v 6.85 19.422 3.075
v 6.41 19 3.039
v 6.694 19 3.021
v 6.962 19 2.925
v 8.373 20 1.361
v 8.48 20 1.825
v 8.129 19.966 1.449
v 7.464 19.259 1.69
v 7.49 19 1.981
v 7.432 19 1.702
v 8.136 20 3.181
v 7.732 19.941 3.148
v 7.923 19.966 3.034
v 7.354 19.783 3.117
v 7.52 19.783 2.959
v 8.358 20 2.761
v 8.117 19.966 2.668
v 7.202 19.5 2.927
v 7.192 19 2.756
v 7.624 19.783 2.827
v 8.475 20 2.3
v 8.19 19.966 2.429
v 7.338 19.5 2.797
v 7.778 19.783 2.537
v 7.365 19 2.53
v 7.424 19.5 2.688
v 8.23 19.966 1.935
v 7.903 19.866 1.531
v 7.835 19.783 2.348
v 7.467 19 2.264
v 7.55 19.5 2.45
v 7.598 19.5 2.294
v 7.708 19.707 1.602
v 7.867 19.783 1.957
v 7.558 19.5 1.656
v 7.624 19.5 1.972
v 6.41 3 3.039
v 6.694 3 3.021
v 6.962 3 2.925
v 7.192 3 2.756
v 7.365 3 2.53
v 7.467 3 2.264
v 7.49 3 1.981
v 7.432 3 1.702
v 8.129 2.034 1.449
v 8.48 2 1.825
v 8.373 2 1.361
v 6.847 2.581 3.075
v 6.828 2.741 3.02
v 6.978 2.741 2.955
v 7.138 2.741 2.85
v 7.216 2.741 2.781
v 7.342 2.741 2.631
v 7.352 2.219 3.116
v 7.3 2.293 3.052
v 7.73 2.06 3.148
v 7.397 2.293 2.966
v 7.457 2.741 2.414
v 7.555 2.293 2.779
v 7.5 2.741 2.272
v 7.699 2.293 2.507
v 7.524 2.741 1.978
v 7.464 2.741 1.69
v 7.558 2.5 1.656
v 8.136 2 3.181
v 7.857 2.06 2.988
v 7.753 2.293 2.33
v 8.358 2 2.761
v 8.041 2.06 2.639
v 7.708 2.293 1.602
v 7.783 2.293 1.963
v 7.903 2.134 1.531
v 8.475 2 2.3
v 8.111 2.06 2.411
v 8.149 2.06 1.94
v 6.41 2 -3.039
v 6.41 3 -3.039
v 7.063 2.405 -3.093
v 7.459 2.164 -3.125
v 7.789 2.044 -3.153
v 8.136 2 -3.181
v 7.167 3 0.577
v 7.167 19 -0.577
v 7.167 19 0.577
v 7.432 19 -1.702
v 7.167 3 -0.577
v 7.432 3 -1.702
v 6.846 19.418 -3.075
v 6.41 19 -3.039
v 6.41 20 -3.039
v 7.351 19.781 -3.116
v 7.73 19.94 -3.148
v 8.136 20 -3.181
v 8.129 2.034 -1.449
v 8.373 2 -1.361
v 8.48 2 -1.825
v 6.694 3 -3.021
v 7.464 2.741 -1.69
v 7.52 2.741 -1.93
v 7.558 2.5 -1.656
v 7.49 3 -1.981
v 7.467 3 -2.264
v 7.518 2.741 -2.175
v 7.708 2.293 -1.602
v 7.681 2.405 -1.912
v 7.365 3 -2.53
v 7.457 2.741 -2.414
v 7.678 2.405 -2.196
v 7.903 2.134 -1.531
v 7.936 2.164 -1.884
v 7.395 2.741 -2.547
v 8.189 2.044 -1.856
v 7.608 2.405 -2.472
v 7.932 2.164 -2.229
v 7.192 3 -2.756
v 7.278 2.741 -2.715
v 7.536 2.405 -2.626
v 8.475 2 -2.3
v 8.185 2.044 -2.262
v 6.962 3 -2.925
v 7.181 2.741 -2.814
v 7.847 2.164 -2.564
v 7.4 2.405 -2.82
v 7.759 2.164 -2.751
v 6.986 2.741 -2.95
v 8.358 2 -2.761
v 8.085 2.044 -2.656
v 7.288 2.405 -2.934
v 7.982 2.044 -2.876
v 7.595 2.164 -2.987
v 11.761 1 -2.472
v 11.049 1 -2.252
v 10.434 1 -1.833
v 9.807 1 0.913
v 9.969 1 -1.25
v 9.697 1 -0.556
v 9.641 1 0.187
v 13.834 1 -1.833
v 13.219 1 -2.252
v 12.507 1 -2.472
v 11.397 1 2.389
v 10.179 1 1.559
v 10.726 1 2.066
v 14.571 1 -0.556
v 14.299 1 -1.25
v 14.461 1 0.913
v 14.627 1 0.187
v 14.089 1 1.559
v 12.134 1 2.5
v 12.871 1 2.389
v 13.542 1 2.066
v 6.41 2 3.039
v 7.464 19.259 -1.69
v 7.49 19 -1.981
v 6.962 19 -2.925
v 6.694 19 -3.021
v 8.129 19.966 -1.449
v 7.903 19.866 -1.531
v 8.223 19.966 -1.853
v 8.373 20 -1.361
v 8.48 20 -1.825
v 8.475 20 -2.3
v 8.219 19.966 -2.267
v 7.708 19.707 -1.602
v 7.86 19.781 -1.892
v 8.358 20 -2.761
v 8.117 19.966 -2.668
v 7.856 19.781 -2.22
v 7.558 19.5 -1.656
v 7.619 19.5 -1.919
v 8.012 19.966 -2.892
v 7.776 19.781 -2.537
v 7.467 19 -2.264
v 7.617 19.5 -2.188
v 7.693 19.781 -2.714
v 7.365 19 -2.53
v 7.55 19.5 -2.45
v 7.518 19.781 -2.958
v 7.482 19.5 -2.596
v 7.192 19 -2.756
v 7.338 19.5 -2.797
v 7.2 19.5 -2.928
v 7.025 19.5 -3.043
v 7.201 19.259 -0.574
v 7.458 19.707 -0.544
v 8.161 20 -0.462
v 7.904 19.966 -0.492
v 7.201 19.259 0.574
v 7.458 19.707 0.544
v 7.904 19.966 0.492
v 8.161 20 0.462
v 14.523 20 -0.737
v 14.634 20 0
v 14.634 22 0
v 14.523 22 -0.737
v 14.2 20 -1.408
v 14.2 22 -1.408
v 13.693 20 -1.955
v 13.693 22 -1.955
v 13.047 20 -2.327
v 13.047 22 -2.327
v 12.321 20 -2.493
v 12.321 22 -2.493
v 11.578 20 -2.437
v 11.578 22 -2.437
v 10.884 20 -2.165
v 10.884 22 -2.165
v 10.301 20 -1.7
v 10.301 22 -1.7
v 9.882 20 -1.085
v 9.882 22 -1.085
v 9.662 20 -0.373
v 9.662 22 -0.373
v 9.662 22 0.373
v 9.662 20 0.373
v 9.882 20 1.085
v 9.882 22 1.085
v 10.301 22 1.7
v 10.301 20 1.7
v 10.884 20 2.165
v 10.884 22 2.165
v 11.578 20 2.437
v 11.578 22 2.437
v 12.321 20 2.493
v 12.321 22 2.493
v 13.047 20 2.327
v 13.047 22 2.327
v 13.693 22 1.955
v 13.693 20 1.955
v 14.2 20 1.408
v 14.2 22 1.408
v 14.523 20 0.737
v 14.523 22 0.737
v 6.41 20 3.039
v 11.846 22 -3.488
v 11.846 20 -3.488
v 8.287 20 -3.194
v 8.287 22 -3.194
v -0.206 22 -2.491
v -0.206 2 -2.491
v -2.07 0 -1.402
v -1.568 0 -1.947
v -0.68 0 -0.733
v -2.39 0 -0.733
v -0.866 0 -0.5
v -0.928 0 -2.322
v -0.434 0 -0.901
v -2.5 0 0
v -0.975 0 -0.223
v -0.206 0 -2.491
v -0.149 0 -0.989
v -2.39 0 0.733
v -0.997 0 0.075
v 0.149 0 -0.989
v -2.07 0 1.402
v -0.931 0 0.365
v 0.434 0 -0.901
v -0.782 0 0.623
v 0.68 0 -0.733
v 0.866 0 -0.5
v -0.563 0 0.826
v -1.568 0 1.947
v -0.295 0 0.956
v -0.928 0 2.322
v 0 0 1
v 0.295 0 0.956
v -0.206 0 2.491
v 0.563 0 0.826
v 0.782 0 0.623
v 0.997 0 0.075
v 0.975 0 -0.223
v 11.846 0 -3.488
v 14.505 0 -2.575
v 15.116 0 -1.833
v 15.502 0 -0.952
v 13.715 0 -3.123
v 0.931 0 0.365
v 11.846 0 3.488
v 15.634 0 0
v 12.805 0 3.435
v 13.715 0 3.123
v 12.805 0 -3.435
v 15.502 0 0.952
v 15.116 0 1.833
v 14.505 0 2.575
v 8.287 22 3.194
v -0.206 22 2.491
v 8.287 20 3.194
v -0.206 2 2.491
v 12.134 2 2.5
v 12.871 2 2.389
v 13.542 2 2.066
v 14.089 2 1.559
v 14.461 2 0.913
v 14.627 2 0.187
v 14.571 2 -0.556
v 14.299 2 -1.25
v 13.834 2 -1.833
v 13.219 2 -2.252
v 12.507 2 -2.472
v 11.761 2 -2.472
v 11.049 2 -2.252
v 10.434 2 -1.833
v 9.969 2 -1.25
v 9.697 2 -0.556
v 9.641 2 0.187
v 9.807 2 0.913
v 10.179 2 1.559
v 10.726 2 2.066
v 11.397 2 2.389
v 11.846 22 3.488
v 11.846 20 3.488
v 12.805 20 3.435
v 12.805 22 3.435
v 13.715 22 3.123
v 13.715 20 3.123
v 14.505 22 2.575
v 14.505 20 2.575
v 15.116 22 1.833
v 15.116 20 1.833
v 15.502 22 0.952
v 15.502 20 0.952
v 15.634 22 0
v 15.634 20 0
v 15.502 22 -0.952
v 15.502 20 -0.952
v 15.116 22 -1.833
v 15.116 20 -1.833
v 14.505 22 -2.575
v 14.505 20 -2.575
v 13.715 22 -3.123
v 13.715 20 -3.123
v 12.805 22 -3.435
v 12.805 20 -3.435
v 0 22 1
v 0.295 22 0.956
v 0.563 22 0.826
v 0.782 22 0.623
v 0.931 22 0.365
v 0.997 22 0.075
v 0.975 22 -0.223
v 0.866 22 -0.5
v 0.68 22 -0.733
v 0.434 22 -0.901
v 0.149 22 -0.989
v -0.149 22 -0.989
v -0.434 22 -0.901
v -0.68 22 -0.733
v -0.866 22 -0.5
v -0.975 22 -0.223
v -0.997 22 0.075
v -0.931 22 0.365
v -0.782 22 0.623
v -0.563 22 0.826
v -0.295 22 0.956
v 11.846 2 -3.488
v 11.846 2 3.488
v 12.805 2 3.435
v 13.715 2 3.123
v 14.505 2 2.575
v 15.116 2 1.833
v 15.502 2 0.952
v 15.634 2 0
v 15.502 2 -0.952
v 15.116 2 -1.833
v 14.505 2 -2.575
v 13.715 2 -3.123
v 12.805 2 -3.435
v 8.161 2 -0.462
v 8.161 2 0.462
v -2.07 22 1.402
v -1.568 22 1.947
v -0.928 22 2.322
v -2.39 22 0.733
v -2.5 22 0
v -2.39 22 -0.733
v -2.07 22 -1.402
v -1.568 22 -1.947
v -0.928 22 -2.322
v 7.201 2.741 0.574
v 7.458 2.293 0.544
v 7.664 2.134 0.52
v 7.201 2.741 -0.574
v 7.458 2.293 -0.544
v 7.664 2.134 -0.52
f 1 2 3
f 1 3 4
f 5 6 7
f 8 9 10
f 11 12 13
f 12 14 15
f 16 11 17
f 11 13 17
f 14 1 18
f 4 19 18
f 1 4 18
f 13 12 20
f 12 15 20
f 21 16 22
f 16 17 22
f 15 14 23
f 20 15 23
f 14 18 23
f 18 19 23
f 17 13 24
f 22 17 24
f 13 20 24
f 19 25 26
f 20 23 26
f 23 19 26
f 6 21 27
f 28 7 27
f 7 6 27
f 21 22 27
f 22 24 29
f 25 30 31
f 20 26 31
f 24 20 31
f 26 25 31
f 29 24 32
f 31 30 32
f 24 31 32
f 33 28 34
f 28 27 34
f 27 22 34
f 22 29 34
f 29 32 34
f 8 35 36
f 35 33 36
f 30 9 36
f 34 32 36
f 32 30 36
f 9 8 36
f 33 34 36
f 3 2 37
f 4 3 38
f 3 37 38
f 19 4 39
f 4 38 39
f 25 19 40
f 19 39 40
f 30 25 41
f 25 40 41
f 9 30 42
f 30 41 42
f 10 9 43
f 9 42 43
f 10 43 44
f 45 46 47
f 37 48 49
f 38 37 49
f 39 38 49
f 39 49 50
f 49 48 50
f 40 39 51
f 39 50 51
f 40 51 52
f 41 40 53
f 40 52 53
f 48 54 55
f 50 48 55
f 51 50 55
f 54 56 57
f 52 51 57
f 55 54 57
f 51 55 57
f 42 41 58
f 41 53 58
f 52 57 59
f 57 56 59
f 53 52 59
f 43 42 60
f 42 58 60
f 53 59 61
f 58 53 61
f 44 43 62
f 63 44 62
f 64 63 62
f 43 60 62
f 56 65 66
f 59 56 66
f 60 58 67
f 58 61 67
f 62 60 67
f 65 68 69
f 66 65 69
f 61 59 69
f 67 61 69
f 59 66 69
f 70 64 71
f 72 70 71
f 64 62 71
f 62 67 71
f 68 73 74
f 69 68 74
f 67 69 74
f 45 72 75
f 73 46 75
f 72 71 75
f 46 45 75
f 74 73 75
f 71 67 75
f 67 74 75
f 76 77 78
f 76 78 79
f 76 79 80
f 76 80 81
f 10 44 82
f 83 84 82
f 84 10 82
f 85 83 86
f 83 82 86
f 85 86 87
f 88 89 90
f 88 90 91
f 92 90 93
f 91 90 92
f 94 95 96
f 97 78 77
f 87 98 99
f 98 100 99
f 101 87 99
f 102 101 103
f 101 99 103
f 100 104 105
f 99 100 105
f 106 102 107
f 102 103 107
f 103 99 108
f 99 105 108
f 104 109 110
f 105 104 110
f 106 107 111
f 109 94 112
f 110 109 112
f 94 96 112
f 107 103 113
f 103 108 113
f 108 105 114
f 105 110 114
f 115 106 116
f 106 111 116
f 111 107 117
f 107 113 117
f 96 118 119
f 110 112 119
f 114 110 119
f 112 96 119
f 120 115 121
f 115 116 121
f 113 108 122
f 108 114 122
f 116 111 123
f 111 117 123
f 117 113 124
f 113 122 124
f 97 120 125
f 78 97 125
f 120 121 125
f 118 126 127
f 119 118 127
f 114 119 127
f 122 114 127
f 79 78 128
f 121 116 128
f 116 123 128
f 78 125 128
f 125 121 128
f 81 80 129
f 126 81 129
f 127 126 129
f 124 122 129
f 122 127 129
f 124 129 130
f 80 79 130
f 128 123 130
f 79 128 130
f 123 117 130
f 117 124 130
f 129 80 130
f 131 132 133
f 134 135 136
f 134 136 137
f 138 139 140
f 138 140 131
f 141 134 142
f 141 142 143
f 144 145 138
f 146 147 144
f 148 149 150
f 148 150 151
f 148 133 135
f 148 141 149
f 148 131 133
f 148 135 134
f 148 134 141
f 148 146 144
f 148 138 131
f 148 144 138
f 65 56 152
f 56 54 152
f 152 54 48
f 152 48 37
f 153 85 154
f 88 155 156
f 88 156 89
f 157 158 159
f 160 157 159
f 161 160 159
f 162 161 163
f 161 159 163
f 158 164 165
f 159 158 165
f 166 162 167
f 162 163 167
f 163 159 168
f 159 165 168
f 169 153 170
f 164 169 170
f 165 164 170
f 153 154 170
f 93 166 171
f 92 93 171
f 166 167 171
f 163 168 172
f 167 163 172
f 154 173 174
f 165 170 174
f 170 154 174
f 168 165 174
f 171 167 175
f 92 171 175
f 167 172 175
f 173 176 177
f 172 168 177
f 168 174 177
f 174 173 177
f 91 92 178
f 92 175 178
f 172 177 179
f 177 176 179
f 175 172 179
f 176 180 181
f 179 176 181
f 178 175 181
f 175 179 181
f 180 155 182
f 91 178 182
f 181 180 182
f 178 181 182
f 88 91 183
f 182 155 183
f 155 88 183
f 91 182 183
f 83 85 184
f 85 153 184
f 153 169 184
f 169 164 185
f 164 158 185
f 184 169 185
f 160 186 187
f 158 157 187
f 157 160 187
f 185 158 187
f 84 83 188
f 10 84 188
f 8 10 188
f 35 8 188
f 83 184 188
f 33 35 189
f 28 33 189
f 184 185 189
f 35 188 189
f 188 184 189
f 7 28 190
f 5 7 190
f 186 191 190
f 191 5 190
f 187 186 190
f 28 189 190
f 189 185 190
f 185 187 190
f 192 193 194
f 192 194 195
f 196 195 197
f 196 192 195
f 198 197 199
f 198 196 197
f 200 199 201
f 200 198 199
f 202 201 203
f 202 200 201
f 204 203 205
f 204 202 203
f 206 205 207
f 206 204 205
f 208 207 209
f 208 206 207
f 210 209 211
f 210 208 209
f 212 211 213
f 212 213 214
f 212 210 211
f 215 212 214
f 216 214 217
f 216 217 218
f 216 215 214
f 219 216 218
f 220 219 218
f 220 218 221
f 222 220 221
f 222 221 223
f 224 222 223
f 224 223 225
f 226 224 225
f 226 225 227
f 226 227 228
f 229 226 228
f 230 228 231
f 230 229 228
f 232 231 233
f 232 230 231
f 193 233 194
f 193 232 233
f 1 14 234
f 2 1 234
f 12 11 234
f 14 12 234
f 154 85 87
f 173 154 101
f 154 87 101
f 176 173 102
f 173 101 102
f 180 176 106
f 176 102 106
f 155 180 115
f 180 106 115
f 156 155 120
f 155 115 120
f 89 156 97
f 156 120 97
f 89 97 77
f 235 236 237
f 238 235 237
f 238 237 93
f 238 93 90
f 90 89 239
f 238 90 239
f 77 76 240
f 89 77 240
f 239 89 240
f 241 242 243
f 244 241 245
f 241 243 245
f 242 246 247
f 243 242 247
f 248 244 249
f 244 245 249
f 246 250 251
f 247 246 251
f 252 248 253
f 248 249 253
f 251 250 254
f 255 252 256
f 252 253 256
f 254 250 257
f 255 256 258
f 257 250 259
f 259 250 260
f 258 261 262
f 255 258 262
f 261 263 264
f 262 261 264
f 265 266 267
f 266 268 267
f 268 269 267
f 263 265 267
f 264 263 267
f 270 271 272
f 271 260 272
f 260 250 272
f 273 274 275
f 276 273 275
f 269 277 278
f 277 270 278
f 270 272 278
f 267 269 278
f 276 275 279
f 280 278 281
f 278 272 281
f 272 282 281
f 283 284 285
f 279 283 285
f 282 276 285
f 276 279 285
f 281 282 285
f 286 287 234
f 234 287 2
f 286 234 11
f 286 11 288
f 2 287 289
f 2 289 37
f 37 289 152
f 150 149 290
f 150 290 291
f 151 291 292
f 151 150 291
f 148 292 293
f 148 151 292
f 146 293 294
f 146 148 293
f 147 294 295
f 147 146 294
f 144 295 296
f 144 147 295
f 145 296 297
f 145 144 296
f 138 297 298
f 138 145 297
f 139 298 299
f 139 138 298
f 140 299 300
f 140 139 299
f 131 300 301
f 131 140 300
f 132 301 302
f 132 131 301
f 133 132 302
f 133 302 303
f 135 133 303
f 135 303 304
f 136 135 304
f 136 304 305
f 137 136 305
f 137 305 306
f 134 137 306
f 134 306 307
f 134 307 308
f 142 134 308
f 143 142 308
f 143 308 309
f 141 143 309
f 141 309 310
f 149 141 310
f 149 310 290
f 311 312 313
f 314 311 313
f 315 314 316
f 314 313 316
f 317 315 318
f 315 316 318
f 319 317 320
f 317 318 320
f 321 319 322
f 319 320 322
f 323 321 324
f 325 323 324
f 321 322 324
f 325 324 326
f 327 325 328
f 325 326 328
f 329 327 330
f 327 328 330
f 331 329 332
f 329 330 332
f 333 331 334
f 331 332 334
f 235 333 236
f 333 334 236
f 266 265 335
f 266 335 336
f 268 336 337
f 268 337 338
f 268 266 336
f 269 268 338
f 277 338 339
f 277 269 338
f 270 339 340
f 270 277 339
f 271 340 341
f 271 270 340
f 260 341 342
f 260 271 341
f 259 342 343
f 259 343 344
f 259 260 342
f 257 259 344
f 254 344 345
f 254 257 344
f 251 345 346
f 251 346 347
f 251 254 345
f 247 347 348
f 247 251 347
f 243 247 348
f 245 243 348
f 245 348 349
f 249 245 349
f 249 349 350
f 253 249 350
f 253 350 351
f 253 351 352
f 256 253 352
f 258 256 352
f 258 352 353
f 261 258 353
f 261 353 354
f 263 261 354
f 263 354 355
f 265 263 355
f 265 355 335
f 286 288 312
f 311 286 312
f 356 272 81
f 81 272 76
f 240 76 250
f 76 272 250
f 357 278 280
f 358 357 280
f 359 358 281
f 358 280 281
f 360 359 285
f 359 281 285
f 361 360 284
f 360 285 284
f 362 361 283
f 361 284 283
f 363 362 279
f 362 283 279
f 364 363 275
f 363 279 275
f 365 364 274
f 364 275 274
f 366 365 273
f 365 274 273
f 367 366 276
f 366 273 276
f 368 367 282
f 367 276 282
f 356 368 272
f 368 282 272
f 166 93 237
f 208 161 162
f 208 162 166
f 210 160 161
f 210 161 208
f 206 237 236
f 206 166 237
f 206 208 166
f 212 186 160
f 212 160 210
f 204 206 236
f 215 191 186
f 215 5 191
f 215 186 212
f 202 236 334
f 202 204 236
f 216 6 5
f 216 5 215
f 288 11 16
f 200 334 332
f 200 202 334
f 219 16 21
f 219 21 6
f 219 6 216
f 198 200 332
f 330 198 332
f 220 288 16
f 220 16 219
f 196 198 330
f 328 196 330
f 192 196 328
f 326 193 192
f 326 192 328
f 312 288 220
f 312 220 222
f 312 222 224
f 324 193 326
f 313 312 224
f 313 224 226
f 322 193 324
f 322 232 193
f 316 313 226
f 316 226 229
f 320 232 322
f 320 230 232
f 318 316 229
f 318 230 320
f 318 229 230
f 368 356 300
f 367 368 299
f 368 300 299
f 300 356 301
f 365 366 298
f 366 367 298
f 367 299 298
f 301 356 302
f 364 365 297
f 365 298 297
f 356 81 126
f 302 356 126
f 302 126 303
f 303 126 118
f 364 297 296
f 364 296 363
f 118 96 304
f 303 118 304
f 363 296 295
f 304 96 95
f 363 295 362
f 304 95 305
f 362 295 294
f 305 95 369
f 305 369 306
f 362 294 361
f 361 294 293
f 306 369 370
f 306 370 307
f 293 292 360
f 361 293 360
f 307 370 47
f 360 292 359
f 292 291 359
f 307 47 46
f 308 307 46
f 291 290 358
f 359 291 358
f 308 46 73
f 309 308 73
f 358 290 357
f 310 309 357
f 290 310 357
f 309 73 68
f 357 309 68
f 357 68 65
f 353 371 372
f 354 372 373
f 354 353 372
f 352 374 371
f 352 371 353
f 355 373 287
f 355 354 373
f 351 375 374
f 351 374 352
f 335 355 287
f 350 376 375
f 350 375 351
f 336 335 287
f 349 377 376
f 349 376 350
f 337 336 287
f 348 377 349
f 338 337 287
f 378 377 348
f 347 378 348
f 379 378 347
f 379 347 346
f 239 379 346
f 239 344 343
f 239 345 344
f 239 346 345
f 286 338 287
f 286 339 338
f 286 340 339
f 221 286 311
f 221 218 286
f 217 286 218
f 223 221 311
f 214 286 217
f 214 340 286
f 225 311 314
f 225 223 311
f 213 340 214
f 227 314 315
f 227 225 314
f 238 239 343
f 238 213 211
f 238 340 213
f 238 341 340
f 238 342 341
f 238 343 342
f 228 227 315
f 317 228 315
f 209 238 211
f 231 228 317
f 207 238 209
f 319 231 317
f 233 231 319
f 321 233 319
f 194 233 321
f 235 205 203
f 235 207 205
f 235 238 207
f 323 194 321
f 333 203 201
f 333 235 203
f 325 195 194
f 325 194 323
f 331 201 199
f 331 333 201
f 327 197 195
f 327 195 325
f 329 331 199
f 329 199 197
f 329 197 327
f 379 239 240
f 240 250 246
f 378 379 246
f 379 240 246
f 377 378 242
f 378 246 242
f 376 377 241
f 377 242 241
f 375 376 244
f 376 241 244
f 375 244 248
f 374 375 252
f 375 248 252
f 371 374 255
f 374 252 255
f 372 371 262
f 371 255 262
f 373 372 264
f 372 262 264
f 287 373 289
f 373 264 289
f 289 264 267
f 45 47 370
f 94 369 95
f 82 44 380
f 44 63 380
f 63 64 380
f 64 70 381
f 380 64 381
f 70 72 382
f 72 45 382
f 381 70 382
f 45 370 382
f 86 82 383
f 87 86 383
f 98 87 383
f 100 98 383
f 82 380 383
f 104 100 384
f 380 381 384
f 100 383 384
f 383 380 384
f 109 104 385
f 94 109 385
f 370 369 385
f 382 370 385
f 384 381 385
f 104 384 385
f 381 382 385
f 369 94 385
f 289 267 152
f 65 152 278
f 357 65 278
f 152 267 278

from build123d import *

# Parameters (mm, degrees)
SKETCH1_R               = 1
SKETCH1_R_2             = 2.5
BOSS_EXTRUDE5_DEPTH     = 2
SKETCH1_7_R             = 2.5
SKETCH1_7_R_2           = 1
BOSS_EXTRUDE6_DEPTH     = 22
BOSS_EXTRUDE7_START     = 20
BOSS_EXTRUDE7_OUTLINE_R = 2.5
BOSS_EXTRUDE7_DEPTH     = 2
SKETCH1_9_R             = 2.5
BOSS_EXTRUDE8_DEPTH     = 1
FILLET3_R               = 1
FILLET1_R               = 1


# Read off the part's stored shape, not the designer's step: Boss-Extrude7
with BuildPart() as part:
    # Sketch1 → Boss-Extrude5 (new body)
    with BuildSketch(Plane(origin=(0, 0, 0), x_dir=(1, 0, 0), z_dir=(0, 1, 0))):
        with BuildLine():
            ThreePointArc((-0.206033327, 2.491495589), (-2.5, 0), (-0.206033327, -2.491495589))
            Line((-0.206033327, -2.491495589), (11.845512634, -3.488093824))
            ThreePointArc((11.845512634, -3.488093824), (15.633959292, 0), (11.845512634, 3.488093824))
            Line((11.845512634, 3.488093824), (-0.206033327, 2.491495589))
        make_face()
        with Locations(Location((0, 0, 0), (0, 0, 270))):
            Circle(SKETCH1_R, mode=Mode.SUBTRACT)
        with Locations(Location((12.133959292, 0, 0), (0, 0, 270))):
            Circle(SKETCH1_R_2, mode=Mode.SUBTRACT)
    extrude(amount=BOSS_EXTRUDE5_DEPTH)

    # Sketch1<7> → Boss-Extrude6 (add)
    # profile 1 of 2: a face of its own
    with BuildSketch(Plane(origin=(0, 0, 0), x_dir=(1, 0, 0), z_dir=(0, 1, 0))):
        Circle(SKETCH1_7_R)
        with Locations(Location((0, 0, 0), (0, 0, 270))):
            Circle(SKETCH1_7_R_2, mode=Mode.SUBTRACT)
    # profile 2 of 2: a face of its own
    with BuildSketch(Plane(origin=(0, 0, 0), x_dir=(1, 0, 0), z_dir=(0, 1, 0))):
        with BuildLine():
            Line((8.286945149, 3.193819373), (-0.206033327, 2.491495589))
            ThreePointArc((-0.206033327, 2.491495589), (1.693357122, 1.839168741), (2.5, 0))
            ThreePointArc((2.5, 0), (1.693357122, -1.839168741), (-0.206033327, -2.491495589))
            Line((-0.206033327, -2.491495589), (8.286945149, -3.193819373))
            ThreePointArc((8.286945149, -3.193819373), (7.133959292, 0), (8.286945149, 3.193819373))
        make_face()
    extrude(amount=BOSS_EXTRUDE6_DEPTH)

    # Boss-Extrude7 outline → Boss-Extrude7 (add)
    with BuildSketch(Plane(origin=(0, 0, 0), x_dir=(1, 0, 0), z_dir=(0, 1, 0)).offset(BOSS_EXTRUDE7_START)):
        with BuildLine():
            Line((8.286945149, -3.193819373), (11.845512634, -3.488093824))
            ThreePointArc((11.845512634, -3.488093824), (15.633959292, 0), (11.845512634, 3.488093824))
            Line((11.845512634, 3.488093824), (8.286945149, 3.193819373))
            ThreePointArc((8.286945149, 3.193819373), (7.133959292, 0), (8.286945149, -3.193819373))
        make_face()
        with Locations((12.133959292, 0)):
            Circle(BOSS_EXTRUDE7_OUTLINE_R, mode=Mode.SUBTRACT)
    extrude(amount=BOSS_EXTRUDE7_DEPTH)

    # Sketch1<9> → Boss-Extrude8 (add)
    with BuildSketch(Plane(origin=(0, 0, 0), x_dir=(1, 0, 0), z_dir=(0, 1, 0))):
        with Locations(Location((12.133959292, 0, 0), (0, 0, 270))):
            Circle(SKETCH1_9_R)
    extrude(amount=BOSS_EXTRUDE8_DEPTH)

    # Fillet3
    # the kernel refuses this fillet: 1 mm, written as the material it takes off along each edge
    with BuildSketch(Plane(origin=(8.286945149, 2, 3.193819373), x_dir=(-0.49694917619000334, 0, -0.8677796473091985), z_dir=(0, 1, 0))) as fillet3_piece_1:
        with BuildLine():
            CenterArc((1.891474067, 0.985105296), FILLET3_R, 145.474338823, 114.624318352)
            Line((1.067601639, 1.55188058), (0, 0))
            ThreePointArc((0, 0), (0.85976094, 0.074473518), (1.719521879, 0))
        make_face()
    extrude(amount=18, mode=Mode.SUBTRACT)
    with BuildSketch(Plane(origin=(8.286945149, 2, -3.193819373), x_dir=(-0.9965982354592262, 0, 0.08241333071510189), z_dir=(0, 1, 0))) as fillet3_piece_2:
        with BuildLine():
            CenterArc((1.883641843, 1), FILLET3_R, 155.375681648, 114.624318352)
            ThreePointArc((0.9745825, 1.416666667), (0.548647928, 0.666123584), (0, 0))
            Line((0, 0), (1.883641843, 0))
        make_face()
    extrude(amount=18, mode=Mode.SUBTRACT)

    # Fillet1
    # the kernel refuses this fillet: 1 mm, written as the material it adds along each edge
    with BuildSketch(Plane(origin=(12.133959294, 20, 0), x_dir=(-0.9403058248886403, 0, -0.34033065639241744), z_dir=(0.34033065639241744, 0, -0.9403058248886403))) as fillet1_piece_1:
        with BuildLine():
            CenterArc((5.000000002 - FILLET1_R, -FILLET1_R), FILLET1_R, 0, 90)
            Line((5.000000002 - FILLET1_R, 0), (5.000000002, 0))
            Line((5.000000002, 0), (5.000000002, -FILLET1_R))
        make_face()
    revolve(axis=Axis((12.133959294, 20, 0), (0, 1, 0)), revolution_arc=39.794041437)
    with BuildSketch(Plane(origin=(12.133959292, 2, 0), x_dir=(-0.9403058248462457, 0, 0.3403306565095503), z_dir=(0.3403306565095503, 0, 0.9403058248462457))) as fillet1_piece_2:
        with BuildLine():
            CenterArc((5 - FILLET1_R, -FILLET1_R), FILLET1_R, 0, 90)
            Line((5 - FILLET1_R, 0), (5, 0))
            Line((5, 0), (5, -FILLET1_R))
        make_face()
    revolve(axis=Axis((12.133959292, 2, 0), (0, -1, 0)), revolution_arc=39.794041451)
    with BuildSketch(Plane(origin=(6.492124343, 2, -2.041983939), x_dir=(0.9403058248461986, 0, 0.34033065650968036), z_dir=(-0.34033065650968036, 0, 0.9403058248461986))) as fillet1_piece_3_section:
        with BuildLine():
            CenterArc((1 + FILLET1_R, FILLET1_R), FILLET1_R, 180, 90)
            Line((1 + FILLET1_R, 0), (1, 0))
            Line((1, 0), (1, FILLET1_R))
        make_face()
    fillet1_piece_3 = revolve(axis=Axis((6.492124343, 2, -2.041983939), (0, 1, 0)), revolution_arc=257.957117876, mode=Mode.PRIVATE)
    fillet1_piece_3 = split(fillet1_piece_3, bisect_by=Plane(origin=(7.34883742, 2.262262875, -3.116242893), z_dir=(0.08241333071510651, 0, 0.9965982354592259)), keep=Keep.TOP, mode=Mode.PRIVATE)
    add(fillet1_piece_3)
    with BuildSketch(Plane(origin=(6.492124343, 20, -2.041983939), x_dir=(0.9403058248461986, 0, 0.34033065650968036), z_dir=(-0.34033065650968036, 0, 0.9403058248461986))) as fillet1_piece_4_section:
        with BuildLine():
            CenterArc((1 + FILLET1_R, -FILLET1_R), FILLET1_R, 90, 90)
            Line((1, -FILLET1_R), (1, 0))
            Line((1, 0), (1 + FILLET1_R, 0))
        make_face()
    fillet1_piece_4 = revolve(axis=Axis((6.492124343, 20, -2.041983939), (0, 1, 0)), revolution_arc=257.957117876, mode=Mode.PRIVATE)
    fillet1_piece_4 = split(fillet1_piece_4, bisect_by=Plane(origin=(7.693506276, 19.839747829, -3.14474516), z_dir=(0.08241333071510651, 0, 0.9965982354592259)), keep=Keep.TOP, mode=Mode.PRIVATE)
    add(fillet1_piece_4)
    with BuildSketch(Plane(origin=(6.492124343, 2, 2.041983939), x_dir=(-0.5290294610510079, 0, -0.8486034582418812), z_dir=(0.8486034582418812, 0, -0.5290294610510079))) as fillet1_piece_5_section:
        with BuildLine():
            CenterArc((1 + FILLET1_R, FILLET1_R), FILLET1_R, 180, 90)
            Line((1 + FILLET1_R, 0), (1, 0))
            Line((1, 0), (1, FILLET1_R))
        make_face()
    fillet1_piece_5 = revolve(axis=Axis((6.492124343, 2, 2.041983939), (0, 1, 0)), revolution_arc=257.957117876, mode=Mode.PRIVATE)
    fillet1_piece_5 = split(fillet1_piece_5, bisect_by=Plane(origin=(7.348749187, 2.26222623, 3.116235597), z_dir=(0.08241333071510651, 0, -0.9965982354592259)), keep=Keep.TOP, mode=Mode.PRIVATE)
    add(fillet1_piece_5)
    with BuildSketch(Plane(origin=(6.492124343, 20, 2.041983939), x_dir=(-0.5290294610510079, 0, -0.8486034582418812), z_dir=(0.8486034582418812, 0, -0.5290294610510079))) as fillet1_piece_6_section:
        with BuildLine():
            CenterArc((1 + FILLET1_R, -FILLET1_R), FILLET1_R, 90, 90)
            Line((1 + FILLET1_R, 0), (1, 0))
            Line((1, 0), (1, -FILLET1_R))
        make_face()
    fillet1_piece_6 = revolve(axis=Axis((6.492124343, 20, 2.041983939), (0, 1, 0)), revolution_arc=257.957117876, mode=Mode.PRIVATE)
    fillet1_piece_6 = split(fillet1_piece_6, bisect_by=Plane(origin=(7.34874918, 19.737773776, 3.116235596), z_dir=(0.08241333071510651, 0, -0.9965982354592259)), keep=Keep.TOP, mode=Mode.PRIVATE)
    add(fillet1_piece_6)


solid = part.part
